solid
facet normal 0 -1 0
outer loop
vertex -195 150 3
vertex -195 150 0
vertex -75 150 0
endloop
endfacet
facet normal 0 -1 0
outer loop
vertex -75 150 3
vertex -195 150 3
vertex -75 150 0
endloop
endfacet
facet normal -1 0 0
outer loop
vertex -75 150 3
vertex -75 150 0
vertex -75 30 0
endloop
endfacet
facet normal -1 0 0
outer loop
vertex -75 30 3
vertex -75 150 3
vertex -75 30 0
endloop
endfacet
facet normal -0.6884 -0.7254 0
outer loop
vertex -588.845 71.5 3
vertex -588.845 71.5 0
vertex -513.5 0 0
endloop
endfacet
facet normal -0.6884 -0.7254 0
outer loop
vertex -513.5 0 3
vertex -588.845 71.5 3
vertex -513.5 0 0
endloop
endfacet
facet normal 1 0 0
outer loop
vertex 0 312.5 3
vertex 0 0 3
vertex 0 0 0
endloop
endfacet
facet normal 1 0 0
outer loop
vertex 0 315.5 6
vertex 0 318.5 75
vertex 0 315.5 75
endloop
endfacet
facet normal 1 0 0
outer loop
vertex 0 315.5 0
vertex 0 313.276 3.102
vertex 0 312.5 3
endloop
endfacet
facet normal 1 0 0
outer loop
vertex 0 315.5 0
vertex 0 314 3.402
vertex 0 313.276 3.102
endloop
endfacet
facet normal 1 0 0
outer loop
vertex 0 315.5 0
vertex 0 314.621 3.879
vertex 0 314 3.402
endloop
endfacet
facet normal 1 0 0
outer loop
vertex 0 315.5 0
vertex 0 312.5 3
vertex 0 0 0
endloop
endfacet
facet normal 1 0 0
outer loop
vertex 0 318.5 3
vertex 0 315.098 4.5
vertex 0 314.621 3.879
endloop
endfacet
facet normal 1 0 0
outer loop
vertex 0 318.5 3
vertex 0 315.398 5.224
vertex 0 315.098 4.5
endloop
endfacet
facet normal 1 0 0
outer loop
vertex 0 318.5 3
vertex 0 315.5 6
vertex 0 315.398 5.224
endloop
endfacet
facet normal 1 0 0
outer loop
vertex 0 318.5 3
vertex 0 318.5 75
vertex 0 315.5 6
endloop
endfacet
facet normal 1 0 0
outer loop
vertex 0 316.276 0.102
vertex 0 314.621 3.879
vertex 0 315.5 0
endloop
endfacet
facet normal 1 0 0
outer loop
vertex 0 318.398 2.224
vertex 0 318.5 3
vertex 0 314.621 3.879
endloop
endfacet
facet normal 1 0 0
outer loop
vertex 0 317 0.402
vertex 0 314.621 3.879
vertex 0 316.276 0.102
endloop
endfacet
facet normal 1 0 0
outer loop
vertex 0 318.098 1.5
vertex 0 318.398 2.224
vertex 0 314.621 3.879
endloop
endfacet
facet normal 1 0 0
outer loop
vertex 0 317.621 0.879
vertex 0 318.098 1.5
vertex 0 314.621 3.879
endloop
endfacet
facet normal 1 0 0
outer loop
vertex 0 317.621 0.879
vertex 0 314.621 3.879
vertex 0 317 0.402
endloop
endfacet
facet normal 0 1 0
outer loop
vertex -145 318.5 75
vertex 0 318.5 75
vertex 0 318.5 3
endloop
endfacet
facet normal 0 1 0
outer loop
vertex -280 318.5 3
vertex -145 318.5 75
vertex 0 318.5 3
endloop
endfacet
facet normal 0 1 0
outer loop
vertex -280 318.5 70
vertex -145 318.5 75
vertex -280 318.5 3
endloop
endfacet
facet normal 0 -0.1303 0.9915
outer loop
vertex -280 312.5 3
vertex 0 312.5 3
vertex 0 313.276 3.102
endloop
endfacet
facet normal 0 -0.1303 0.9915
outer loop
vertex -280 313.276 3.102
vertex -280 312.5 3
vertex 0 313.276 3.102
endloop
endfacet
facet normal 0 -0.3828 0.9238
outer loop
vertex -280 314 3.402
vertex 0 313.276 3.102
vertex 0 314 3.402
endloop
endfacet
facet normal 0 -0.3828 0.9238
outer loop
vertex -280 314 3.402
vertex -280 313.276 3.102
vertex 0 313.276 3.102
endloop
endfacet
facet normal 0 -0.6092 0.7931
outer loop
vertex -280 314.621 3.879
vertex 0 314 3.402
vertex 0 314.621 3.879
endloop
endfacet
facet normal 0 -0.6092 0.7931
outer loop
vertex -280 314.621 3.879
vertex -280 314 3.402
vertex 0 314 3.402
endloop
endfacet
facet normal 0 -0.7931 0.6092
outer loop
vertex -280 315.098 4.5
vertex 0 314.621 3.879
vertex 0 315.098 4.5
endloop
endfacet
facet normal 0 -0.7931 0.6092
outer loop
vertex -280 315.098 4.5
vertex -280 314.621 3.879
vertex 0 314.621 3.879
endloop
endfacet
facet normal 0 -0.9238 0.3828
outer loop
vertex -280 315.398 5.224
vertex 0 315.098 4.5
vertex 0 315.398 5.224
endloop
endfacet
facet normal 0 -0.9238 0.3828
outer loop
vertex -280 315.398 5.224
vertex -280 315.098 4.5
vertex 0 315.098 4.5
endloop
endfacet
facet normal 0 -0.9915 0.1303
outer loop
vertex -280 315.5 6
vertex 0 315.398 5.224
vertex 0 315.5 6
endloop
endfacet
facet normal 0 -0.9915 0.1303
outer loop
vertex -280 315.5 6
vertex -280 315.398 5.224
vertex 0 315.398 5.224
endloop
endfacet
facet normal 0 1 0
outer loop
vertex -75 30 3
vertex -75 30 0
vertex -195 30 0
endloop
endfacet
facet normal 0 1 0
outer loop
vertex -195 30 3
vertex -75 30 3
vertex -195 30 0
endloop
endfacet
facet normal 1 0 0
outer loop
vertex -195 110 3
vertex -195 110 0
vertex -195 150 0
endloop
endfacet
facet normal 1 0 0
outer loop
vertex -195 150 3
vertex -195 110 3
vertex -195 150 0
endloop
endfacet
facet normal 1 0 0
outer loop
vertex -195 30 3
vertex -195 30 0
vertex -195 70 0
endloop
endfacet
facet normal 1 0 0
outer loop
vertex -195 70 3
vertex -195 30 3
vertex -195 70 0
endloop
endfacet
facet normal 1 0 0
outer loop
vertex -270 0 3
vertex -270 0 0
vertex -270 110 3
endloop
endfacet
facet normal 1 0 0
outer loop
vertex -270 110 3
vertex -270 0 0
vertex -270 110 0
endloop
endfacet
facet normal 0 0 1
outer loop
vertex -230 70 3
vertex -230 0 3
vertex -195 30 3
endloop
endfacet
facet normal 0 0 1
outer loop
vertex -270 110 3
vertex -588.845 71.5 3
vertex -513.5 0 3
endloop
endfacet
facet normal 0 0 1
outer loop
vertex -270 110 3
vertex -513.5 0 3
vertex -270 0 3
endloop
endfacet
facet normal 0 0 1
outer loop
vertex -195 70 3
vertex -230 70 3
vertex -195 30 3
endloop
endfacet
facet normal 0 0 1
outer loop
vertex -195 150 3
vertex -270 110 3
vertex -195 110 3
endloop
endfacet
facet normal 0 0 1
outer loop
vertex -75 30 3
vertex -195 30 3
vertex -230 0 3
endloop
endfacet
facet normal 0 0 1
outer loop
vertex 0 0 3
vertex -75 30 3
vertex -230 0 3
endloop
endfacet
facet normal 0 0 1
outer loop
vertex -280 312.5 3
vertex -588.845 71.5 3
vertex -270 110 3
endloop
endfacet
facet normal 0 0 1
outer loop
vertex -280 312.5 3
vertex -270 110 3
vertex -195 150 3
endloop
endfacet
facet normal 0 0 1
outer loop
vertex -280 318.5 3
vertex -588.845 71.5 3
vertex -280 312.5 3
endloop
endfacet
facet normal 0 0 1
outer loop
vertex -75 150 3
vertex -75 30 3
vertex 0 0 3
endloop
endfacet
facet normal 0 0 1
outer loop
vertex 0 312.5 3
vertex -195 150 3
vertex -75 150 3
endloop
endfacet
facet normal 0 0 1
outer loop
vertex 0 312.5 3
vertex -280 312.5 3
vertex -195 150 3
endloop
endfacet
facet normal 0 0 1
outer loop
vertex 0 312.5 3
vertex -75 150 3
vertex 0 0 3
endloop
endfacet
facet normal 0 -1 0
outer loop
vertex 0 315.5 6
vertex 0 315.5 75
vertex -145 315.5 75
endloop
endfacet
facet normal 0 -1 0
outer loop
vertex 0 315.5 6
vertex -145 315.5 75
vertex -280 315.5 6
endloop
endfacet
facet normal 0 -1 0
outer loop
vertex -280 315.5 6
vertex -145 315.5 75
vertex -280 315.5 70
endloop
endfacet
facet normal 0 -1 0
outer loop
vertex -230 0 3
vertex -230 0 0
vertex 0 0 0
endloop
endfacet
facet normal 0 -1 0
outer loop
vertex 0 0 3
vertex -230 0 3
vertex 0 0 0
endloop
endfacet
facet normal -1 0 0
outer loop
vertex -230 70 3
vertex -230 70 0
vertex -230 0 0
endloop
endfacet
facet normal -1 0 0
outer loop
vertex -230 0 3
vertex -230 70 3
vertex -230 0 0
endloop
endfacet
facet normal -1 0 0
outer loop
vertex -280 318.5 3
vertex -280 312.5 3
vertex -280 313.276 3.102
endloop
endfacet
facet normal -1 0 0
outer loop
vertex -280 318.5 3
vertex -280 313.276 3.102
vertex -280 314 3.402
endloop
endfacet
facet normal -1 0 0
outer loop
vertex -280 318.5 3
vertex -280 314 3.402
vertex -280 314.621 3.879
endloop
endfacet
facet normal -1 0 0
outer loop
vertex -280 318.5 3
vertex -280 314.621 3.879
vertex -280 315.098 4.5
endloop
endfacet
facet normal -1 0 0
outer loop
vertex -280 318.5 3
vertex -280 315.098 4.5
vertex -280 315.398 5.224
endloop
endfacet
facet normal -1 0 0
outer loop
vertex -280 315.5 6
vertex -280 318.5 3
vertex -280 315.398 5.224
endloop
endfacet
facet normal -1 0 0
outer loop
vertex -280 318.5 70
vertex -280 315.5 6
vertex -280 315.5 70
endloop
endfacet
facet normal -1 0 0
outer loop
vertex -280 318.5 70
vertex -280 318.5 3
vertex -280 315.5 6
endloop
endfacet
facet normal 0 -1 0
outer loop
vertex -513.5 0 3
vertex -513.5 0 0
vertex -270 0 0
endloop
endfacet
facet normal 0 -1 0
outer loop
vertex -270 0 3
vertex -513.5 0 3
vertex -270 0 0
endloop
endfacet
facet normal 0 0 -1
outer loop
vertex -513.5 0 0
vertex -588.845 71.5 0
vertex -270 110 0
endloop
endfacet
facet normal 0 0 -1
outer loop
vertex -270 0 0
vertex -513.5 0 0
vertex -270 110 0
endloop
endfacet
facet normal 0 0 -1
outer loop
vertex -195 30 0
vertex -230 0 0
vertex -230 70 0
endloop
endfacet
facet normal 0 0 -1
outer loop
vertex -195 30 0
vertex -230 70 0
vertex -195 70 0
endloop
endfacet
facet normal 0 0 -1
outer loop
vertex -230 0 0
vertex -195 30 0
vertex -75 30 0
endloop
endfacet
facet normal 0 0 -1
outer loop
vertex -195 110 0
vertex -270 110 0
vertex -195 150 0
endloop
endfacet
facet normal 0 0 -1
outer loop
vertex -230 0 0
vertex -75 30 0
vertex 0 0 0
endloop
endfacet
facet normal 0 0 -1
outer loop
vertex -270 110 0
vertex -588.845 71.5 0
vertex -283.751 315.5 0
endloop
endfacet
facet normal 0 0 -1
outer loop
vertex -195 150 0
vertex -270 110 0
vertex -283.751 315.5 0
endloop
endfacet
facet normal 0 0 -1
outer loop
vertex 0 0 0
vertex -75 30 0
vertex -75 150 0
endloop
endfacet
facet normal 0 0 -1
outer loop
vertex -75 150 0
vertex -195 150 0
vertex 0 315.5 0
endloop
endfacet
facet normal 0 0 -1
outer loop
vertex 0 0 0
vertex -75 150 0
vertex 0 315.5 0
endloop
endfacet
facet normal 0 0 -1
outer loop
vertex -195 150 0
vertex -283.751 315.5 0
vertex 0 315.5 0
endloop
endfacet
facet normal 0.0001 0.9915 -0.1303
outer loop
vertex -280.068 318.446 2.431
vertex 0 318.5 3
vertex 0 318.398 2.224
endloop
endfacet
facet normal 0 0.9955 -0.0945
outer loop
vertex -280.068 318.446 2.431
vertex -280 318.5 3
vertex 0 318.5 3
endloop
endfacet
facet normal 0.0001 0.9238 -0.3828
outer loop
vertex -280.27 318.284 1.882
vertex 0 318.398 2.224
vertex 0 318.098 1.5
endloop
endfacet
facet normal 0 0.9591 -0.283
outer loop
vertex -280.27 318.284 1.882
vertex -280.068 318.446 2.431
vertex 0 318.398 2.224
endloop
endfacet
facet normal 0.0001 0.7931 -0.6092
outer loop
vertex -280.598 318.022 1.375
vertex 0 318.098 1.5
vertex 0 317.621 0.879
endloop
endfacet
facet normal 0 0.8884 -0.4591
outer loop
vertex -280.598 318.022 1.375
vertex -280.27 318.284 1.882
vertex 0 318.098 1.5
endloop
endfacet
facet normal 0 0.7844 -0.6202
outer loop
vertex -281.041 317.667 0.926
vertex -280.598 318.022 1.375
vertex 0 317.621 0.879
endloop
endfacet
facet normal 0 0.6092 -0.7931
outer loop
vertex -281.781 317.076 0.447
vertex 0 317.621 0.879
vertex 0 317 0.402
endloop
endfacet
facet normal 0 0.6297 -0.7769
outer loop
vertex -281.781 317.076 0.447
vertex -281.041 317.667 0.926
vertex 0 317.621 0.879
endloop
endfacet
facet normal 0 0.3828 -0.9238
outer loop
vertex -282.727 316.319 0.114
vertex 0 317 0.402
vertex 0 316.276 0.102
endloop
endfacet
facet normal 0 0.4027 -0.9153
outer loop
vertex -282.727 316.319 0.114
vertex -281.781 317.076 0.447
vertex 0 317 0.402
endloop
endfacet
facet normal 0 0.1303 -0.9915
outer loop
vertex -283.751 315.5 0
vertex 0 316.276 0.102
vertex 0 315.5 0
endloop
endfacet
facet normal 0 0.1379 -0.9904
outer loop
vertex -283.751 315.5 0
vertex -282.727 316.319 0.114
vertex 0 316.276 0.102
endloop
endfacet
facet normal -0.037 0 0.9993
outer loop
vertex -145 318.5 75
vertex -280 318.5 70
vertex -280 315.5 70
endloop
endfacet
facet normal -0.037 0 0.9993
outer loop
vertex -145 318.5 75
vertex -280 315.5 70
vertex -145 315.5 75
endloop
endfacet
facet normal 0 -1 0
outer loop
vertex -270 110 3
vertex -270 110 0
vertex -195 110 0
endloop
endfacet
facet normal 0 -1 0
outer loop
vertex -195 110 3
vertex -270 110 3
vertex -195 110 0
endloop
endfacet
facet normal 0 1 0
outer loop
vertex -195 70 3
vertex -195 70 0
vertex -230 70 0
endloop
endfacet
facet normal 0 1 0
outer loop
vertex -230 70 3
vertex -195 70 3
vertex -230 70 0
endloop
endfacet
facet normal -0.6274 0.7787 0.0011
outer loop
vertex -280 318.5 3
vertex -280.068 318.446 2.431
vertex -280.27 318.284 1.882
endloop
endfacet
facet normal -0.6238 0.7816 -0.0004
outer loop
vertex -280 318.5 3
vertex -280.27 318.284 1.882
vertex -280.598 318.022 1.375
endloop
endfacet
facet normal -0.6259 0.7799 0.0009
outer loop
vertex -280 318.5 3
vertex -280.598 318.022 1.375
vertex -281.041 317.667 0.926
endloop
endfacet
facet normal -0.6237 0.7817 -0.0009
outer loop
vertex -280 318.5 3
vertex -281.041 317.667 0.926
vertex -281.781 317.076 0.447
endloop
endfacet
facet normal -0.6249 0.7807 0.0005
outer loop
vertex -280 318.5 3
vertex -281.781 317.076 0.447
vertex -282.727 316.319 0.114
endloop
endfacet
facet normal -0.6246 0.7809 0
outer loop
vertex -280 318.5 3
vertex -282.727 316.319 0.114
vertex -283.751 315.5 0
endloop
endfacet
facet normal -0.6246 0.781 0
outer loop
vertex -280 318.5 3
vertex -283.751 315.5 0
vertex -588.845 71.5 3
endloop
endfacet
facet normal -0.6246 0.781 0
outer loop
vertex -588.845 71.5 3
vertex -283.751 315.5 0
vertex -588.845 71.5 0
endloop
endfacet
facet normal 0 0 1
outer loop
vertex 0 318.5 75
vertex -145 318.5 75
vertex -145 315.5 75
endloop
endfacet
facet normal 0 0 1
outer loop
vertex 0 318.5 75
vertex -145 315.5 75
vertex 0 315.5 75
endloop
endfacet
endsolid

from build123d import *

# Parameters (mm, degrees)
F1_DEPTH = 3
F3_DEPTH = 3
F4_R     = 3


with BuildPart() as f1:
    # F0 (on Top) → F1 (new body)
    with BuildSketch(Plane.XY):
        Polygon((-230, 0), (0, 0), (0, 318.5), (-280, 318.5), (-588.845279, 71.5), (-513.5, 0), (-270, 0), (-270, 110), (-195, 110), (-195, 150), (-75, 150), (-75, 30), (-195, 30), (-195, 70), (-230, 70), align=None)
    extrude(amount=F1_DEPTH)

    # F2 (on face) → F3 (join)
    with BuildSketch(Plane(origin=(0, 318.5, 0), x_dir=(-1, 0, 0), z_dir=(0, 1, 0))):
        Polygon((0, 75), (0, 3), (280, 3), (280, 70), (145, 75), align=None)
    extrude(amount=-F3_DEPTH)

    # F4
    f4_edges = [f1.edges().sort_by_distance(p)[0] for p in [
        (-140, 315.5, 3),
        (-140, 318.5, 0),
    ]]
    fillet(f4_edges, radius=F4_R)


solid = f1.part
